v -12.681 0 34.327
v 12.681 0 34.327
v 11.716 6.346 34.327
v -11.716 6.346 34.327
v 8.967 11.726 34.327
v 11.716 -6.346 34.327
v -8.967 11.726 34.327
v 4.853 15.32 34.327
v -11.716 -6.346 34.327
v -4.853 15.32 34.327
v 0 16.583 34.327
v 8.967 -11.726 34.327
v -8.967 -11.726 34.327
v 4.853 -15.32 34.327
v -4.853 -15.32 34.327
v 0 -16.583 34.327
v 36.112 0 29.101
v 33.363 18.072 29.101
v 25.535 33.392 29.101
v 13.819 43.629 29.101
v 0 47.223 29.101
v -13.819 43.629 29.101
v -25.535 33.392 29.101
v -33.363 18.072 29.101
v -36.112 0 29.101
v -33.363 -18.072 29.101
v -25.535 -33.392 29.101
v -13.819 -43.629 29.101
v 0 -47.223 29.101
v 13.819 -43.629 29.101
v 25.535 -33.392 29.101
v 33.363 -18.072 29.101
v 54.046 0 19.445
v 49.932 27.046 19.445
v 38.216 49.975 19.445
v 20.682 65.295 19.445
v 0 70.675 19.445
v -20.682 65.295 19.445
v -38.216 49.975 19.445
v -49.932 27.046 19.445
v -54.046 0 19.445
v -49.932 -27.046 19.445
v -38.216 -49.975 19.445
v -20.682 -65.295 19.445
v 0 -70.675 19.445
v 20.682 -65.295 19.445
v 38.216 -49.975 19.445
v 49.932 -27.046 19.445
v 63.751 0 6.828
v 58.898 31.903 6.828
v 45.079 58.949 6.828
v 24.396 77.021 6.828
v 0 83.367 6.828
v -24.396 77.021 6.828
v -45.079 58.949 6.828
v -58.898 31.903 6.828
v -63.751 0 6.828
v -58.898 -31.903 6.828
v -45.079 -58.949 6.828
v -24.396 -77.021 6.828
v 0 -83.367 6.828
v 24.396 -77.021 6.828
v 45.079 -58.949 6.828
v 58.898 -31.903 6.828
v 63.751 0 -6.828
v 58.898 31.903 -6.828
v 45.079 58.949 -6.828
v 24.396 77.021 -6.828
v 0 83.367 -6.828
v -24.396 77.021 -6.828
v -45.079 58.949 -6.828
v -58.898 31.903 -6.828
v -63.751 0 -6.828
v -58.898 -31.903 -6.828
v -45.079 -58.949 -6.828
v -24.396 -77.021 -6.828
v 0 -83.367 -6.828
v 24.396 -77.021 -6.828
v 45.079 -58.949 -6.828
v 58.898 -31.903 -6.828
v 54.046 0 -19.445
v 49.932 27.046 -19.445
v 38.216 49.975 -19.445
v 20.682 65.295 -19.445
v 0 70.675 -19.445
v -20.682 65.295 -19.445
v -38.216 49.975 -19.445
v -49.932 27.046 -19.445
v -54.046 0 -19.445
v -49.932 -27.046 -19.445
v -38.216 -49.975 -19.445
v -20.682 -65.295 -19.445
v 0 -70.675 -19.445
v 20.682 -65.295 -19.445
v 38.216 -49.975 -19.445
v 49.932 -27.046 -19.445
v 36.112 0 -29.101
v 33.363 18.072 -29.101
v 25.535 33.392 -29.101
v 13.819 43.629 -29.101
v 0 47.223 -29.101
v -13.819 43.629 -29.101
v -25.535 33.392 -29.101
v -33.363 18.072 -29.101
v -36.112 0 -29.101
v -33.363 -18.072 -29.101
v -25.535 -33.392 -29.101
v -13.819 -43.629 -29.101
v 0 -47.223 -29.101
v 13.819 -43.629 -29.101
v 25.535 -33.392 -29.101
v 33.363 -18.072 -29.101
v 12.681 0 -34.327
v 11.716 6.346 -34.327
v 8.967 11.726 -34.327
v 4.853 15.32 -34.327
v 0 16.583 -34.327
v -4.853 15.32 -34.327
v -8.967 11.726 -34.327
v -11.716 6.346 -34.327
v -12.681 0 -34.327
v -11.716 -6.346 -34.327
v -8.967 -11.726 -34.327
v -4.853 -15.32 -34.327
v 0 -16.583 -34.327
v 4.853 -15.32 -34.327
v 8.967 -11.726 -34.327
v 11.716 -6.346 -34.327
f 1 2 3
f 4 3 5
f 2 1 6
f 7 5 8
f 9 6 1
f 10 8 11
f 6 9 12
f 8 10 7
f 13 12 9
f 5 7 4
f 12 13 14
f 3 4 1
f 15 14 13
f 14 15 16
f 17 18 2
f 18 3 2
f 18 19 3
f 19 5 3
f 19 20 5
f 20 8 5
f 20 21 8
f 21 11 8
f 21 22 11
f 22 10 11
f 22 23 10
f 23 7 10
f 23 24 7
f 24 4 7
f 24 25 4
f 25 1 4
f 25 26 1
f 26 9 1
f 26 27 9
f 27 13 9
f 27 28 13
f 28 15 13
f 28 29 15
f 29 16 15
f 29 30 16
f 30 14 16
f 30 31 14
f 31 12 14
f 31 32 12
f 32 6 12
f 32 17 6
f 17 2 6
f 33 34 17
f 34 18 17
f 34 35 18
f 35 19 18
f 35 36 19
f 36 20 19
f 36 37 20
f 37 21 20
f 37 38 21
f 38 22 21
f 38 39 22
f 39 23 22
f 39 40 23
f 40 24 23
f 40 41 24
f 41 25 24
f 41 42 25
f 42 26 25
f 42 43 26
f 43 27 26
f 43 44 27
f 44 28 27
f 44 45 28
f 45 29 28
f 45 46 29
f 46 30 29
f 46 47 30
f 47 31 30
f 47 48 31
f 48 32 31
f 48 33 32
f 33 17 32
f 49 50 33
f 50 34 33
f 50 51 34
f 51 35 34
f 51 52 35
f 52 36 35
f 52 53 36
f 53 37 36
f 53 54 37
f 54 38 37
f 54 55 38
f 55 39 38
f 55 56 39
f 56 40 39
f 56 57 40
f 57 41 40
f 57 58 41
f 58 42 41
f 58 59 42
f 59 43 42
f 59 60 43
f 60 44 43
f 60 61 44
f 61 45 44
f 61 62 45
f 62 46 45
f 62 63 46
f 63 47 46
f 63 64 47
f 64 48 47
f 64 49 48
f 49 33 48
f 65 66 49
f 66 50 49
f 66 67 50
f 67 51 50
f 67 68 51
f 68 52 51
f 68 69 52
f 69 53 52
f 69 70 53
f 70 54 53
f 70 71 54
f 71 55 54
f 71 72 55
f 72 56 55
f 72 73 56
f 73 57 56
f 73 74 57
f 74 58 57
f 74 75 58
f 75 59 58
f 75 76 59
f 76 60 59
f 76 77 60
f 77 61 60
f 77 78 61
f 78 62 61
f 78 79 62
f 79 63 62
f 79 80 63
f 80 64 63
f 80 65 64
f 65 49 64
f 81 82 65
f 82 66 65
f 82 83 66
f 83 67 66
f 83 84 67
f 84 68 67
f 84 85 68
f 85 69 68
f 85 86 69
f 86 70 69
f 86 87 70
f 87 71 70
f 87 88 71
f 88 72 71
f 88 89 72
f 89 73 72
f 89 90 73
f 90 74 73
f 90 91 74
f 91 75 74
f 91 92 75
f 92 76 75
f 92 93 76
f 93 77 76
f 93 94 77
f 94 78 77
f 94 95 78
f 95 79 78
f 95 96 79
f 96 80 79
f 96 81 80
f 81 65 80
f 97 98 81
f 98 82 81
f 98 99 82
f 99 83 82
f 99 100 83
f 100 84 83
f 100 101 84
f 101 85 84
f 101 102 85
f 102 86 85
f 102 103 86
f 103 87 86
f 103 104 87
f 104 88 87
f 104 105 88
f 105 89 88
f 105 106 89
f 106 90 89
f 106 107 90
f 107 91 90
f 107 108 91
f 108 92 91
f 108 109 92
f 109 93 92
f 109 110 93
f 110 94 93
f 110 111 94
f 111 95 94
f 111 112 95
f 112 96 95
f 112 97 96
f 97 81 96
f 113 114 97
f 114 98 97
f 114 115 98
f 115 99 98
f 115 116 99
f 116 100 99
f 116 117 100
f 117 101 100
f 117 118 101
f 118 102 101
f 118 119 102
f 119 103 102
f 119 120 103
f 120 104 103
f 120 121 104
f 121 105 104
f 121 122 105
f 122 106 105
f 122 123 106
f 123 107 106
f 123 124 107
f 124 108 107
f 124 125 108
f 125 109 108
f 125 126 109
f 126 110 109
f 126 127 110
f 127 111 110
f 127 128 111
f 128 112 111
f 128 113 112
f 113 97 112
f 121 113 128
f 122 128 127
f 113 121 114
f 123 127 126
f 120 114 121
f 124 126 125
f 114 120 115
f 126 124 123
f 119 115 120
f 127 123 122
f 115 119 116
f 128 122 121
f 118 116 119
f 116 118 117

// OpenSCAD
// Generated by SolidPython 1.0.1 on 2020-07-29 00:46:51


scale(v = [13, 17, 7]) {
	sphere(r = 5);
}
/***********************************************
*********      SolidPython code:      **********
************************************************
 
# import packages: SolidPython
from solid import *
from solid.utils import *
from itertools import chain, combinations, permutations


class Resize:

    def __init__(self, scad_file):
        self.scad_file = scad_file
        #self.scad_file = import_scad(scad_file)
        # cone/cylinder param:
        self.r1 = 0
        self.r2 = 0
        self.h = 0
        # rectangular prism param:
        self.w = 0
        self.l = 0
        # ellipse param:
        self.r = 0

    # import OpenScad code (file name corresponds to shape)


    # classify shape + parameters
    def assign(self, param1, param2, param3):
        if self.scad_file == 'cone.scad':
            self.r1 = param1
            self.r2 = param2
            self.h = param3
        elif self.scad_file == 'cylinder.scad':
            self.r1 = param1
            self.r2 = param2
            self.h = param3
        elif self.scad_file == 'rectangularPrism.scad':
            self.h = param1
            self.l = param2
            self.w = param3
        else:
            self.r = param1
            self.h = param2

    # resize parameters
    def iterate(self):
        x = range(3, 20, 2)
        i = 1
        if self.scad_file == 'cone.scad':
            tempList = list(permutations(x, 2))
            for temp in tempList:
                param1 = temp[0]
                param2 = temp[1]
                filepath = 'produced_scad_files/' + 'cone' + str(param1) + '_' + str(param2) + '_' + '.scad'
                scad_render_to_file(cylinder(h=param1, r1=param2, r2=0), filepath)

        elif self.scad_file == 'cylinder.scad':
            tempList = list(permutations(x, 3))
            for temp in tempList:
                param1 = temp[0]
                param2 = temp[1]
                filepath = 'produced_scad_files/' + 'cylinder' + str(param1) + '_' + str(param2) + '_' + '.scad'
                scad_render_to_file(cylinder(h=param1, r1=param2, r2=param2), filepath)

        elif self.scad_file == 'rectangularPrism.scad':
            tempList = list(permutations(x, 3))
            for temp in tempList:
                param1 = temp[0]
                param2 = temp[1]
                param3 = temp[2]
                filepath = 'produced_scad_files/' + 'rectangularPrism' + str(param1) + '_' + str(param2) + '_' + str(
                    param3) + '.scad'
                scad_render_to_file(cube(size=(param1, param2, param3)), filepath)

        elif self.scad_file == 'ellipse.scad':
            tempList = list(permutations(x, 4))
            for temp in tempList:
                param1 = temp[0]
                param2 = temp[1]
                param3 = temp[2]
                param4 = temp[3]
                filepath = 'produced_scad_files/' + 'ellipse' + str(param1) + '_' + str(param2) + '_' + str(param3) + '_' + str(param4) + '.scad'
                scad_render_to_file(scale([param1, param2, param3])(sphere(r=param4)), filepath)

    def render_to_scadfile(self):
        scad_render_to_file(scad, 'example.scad') 
 
************************************************/
